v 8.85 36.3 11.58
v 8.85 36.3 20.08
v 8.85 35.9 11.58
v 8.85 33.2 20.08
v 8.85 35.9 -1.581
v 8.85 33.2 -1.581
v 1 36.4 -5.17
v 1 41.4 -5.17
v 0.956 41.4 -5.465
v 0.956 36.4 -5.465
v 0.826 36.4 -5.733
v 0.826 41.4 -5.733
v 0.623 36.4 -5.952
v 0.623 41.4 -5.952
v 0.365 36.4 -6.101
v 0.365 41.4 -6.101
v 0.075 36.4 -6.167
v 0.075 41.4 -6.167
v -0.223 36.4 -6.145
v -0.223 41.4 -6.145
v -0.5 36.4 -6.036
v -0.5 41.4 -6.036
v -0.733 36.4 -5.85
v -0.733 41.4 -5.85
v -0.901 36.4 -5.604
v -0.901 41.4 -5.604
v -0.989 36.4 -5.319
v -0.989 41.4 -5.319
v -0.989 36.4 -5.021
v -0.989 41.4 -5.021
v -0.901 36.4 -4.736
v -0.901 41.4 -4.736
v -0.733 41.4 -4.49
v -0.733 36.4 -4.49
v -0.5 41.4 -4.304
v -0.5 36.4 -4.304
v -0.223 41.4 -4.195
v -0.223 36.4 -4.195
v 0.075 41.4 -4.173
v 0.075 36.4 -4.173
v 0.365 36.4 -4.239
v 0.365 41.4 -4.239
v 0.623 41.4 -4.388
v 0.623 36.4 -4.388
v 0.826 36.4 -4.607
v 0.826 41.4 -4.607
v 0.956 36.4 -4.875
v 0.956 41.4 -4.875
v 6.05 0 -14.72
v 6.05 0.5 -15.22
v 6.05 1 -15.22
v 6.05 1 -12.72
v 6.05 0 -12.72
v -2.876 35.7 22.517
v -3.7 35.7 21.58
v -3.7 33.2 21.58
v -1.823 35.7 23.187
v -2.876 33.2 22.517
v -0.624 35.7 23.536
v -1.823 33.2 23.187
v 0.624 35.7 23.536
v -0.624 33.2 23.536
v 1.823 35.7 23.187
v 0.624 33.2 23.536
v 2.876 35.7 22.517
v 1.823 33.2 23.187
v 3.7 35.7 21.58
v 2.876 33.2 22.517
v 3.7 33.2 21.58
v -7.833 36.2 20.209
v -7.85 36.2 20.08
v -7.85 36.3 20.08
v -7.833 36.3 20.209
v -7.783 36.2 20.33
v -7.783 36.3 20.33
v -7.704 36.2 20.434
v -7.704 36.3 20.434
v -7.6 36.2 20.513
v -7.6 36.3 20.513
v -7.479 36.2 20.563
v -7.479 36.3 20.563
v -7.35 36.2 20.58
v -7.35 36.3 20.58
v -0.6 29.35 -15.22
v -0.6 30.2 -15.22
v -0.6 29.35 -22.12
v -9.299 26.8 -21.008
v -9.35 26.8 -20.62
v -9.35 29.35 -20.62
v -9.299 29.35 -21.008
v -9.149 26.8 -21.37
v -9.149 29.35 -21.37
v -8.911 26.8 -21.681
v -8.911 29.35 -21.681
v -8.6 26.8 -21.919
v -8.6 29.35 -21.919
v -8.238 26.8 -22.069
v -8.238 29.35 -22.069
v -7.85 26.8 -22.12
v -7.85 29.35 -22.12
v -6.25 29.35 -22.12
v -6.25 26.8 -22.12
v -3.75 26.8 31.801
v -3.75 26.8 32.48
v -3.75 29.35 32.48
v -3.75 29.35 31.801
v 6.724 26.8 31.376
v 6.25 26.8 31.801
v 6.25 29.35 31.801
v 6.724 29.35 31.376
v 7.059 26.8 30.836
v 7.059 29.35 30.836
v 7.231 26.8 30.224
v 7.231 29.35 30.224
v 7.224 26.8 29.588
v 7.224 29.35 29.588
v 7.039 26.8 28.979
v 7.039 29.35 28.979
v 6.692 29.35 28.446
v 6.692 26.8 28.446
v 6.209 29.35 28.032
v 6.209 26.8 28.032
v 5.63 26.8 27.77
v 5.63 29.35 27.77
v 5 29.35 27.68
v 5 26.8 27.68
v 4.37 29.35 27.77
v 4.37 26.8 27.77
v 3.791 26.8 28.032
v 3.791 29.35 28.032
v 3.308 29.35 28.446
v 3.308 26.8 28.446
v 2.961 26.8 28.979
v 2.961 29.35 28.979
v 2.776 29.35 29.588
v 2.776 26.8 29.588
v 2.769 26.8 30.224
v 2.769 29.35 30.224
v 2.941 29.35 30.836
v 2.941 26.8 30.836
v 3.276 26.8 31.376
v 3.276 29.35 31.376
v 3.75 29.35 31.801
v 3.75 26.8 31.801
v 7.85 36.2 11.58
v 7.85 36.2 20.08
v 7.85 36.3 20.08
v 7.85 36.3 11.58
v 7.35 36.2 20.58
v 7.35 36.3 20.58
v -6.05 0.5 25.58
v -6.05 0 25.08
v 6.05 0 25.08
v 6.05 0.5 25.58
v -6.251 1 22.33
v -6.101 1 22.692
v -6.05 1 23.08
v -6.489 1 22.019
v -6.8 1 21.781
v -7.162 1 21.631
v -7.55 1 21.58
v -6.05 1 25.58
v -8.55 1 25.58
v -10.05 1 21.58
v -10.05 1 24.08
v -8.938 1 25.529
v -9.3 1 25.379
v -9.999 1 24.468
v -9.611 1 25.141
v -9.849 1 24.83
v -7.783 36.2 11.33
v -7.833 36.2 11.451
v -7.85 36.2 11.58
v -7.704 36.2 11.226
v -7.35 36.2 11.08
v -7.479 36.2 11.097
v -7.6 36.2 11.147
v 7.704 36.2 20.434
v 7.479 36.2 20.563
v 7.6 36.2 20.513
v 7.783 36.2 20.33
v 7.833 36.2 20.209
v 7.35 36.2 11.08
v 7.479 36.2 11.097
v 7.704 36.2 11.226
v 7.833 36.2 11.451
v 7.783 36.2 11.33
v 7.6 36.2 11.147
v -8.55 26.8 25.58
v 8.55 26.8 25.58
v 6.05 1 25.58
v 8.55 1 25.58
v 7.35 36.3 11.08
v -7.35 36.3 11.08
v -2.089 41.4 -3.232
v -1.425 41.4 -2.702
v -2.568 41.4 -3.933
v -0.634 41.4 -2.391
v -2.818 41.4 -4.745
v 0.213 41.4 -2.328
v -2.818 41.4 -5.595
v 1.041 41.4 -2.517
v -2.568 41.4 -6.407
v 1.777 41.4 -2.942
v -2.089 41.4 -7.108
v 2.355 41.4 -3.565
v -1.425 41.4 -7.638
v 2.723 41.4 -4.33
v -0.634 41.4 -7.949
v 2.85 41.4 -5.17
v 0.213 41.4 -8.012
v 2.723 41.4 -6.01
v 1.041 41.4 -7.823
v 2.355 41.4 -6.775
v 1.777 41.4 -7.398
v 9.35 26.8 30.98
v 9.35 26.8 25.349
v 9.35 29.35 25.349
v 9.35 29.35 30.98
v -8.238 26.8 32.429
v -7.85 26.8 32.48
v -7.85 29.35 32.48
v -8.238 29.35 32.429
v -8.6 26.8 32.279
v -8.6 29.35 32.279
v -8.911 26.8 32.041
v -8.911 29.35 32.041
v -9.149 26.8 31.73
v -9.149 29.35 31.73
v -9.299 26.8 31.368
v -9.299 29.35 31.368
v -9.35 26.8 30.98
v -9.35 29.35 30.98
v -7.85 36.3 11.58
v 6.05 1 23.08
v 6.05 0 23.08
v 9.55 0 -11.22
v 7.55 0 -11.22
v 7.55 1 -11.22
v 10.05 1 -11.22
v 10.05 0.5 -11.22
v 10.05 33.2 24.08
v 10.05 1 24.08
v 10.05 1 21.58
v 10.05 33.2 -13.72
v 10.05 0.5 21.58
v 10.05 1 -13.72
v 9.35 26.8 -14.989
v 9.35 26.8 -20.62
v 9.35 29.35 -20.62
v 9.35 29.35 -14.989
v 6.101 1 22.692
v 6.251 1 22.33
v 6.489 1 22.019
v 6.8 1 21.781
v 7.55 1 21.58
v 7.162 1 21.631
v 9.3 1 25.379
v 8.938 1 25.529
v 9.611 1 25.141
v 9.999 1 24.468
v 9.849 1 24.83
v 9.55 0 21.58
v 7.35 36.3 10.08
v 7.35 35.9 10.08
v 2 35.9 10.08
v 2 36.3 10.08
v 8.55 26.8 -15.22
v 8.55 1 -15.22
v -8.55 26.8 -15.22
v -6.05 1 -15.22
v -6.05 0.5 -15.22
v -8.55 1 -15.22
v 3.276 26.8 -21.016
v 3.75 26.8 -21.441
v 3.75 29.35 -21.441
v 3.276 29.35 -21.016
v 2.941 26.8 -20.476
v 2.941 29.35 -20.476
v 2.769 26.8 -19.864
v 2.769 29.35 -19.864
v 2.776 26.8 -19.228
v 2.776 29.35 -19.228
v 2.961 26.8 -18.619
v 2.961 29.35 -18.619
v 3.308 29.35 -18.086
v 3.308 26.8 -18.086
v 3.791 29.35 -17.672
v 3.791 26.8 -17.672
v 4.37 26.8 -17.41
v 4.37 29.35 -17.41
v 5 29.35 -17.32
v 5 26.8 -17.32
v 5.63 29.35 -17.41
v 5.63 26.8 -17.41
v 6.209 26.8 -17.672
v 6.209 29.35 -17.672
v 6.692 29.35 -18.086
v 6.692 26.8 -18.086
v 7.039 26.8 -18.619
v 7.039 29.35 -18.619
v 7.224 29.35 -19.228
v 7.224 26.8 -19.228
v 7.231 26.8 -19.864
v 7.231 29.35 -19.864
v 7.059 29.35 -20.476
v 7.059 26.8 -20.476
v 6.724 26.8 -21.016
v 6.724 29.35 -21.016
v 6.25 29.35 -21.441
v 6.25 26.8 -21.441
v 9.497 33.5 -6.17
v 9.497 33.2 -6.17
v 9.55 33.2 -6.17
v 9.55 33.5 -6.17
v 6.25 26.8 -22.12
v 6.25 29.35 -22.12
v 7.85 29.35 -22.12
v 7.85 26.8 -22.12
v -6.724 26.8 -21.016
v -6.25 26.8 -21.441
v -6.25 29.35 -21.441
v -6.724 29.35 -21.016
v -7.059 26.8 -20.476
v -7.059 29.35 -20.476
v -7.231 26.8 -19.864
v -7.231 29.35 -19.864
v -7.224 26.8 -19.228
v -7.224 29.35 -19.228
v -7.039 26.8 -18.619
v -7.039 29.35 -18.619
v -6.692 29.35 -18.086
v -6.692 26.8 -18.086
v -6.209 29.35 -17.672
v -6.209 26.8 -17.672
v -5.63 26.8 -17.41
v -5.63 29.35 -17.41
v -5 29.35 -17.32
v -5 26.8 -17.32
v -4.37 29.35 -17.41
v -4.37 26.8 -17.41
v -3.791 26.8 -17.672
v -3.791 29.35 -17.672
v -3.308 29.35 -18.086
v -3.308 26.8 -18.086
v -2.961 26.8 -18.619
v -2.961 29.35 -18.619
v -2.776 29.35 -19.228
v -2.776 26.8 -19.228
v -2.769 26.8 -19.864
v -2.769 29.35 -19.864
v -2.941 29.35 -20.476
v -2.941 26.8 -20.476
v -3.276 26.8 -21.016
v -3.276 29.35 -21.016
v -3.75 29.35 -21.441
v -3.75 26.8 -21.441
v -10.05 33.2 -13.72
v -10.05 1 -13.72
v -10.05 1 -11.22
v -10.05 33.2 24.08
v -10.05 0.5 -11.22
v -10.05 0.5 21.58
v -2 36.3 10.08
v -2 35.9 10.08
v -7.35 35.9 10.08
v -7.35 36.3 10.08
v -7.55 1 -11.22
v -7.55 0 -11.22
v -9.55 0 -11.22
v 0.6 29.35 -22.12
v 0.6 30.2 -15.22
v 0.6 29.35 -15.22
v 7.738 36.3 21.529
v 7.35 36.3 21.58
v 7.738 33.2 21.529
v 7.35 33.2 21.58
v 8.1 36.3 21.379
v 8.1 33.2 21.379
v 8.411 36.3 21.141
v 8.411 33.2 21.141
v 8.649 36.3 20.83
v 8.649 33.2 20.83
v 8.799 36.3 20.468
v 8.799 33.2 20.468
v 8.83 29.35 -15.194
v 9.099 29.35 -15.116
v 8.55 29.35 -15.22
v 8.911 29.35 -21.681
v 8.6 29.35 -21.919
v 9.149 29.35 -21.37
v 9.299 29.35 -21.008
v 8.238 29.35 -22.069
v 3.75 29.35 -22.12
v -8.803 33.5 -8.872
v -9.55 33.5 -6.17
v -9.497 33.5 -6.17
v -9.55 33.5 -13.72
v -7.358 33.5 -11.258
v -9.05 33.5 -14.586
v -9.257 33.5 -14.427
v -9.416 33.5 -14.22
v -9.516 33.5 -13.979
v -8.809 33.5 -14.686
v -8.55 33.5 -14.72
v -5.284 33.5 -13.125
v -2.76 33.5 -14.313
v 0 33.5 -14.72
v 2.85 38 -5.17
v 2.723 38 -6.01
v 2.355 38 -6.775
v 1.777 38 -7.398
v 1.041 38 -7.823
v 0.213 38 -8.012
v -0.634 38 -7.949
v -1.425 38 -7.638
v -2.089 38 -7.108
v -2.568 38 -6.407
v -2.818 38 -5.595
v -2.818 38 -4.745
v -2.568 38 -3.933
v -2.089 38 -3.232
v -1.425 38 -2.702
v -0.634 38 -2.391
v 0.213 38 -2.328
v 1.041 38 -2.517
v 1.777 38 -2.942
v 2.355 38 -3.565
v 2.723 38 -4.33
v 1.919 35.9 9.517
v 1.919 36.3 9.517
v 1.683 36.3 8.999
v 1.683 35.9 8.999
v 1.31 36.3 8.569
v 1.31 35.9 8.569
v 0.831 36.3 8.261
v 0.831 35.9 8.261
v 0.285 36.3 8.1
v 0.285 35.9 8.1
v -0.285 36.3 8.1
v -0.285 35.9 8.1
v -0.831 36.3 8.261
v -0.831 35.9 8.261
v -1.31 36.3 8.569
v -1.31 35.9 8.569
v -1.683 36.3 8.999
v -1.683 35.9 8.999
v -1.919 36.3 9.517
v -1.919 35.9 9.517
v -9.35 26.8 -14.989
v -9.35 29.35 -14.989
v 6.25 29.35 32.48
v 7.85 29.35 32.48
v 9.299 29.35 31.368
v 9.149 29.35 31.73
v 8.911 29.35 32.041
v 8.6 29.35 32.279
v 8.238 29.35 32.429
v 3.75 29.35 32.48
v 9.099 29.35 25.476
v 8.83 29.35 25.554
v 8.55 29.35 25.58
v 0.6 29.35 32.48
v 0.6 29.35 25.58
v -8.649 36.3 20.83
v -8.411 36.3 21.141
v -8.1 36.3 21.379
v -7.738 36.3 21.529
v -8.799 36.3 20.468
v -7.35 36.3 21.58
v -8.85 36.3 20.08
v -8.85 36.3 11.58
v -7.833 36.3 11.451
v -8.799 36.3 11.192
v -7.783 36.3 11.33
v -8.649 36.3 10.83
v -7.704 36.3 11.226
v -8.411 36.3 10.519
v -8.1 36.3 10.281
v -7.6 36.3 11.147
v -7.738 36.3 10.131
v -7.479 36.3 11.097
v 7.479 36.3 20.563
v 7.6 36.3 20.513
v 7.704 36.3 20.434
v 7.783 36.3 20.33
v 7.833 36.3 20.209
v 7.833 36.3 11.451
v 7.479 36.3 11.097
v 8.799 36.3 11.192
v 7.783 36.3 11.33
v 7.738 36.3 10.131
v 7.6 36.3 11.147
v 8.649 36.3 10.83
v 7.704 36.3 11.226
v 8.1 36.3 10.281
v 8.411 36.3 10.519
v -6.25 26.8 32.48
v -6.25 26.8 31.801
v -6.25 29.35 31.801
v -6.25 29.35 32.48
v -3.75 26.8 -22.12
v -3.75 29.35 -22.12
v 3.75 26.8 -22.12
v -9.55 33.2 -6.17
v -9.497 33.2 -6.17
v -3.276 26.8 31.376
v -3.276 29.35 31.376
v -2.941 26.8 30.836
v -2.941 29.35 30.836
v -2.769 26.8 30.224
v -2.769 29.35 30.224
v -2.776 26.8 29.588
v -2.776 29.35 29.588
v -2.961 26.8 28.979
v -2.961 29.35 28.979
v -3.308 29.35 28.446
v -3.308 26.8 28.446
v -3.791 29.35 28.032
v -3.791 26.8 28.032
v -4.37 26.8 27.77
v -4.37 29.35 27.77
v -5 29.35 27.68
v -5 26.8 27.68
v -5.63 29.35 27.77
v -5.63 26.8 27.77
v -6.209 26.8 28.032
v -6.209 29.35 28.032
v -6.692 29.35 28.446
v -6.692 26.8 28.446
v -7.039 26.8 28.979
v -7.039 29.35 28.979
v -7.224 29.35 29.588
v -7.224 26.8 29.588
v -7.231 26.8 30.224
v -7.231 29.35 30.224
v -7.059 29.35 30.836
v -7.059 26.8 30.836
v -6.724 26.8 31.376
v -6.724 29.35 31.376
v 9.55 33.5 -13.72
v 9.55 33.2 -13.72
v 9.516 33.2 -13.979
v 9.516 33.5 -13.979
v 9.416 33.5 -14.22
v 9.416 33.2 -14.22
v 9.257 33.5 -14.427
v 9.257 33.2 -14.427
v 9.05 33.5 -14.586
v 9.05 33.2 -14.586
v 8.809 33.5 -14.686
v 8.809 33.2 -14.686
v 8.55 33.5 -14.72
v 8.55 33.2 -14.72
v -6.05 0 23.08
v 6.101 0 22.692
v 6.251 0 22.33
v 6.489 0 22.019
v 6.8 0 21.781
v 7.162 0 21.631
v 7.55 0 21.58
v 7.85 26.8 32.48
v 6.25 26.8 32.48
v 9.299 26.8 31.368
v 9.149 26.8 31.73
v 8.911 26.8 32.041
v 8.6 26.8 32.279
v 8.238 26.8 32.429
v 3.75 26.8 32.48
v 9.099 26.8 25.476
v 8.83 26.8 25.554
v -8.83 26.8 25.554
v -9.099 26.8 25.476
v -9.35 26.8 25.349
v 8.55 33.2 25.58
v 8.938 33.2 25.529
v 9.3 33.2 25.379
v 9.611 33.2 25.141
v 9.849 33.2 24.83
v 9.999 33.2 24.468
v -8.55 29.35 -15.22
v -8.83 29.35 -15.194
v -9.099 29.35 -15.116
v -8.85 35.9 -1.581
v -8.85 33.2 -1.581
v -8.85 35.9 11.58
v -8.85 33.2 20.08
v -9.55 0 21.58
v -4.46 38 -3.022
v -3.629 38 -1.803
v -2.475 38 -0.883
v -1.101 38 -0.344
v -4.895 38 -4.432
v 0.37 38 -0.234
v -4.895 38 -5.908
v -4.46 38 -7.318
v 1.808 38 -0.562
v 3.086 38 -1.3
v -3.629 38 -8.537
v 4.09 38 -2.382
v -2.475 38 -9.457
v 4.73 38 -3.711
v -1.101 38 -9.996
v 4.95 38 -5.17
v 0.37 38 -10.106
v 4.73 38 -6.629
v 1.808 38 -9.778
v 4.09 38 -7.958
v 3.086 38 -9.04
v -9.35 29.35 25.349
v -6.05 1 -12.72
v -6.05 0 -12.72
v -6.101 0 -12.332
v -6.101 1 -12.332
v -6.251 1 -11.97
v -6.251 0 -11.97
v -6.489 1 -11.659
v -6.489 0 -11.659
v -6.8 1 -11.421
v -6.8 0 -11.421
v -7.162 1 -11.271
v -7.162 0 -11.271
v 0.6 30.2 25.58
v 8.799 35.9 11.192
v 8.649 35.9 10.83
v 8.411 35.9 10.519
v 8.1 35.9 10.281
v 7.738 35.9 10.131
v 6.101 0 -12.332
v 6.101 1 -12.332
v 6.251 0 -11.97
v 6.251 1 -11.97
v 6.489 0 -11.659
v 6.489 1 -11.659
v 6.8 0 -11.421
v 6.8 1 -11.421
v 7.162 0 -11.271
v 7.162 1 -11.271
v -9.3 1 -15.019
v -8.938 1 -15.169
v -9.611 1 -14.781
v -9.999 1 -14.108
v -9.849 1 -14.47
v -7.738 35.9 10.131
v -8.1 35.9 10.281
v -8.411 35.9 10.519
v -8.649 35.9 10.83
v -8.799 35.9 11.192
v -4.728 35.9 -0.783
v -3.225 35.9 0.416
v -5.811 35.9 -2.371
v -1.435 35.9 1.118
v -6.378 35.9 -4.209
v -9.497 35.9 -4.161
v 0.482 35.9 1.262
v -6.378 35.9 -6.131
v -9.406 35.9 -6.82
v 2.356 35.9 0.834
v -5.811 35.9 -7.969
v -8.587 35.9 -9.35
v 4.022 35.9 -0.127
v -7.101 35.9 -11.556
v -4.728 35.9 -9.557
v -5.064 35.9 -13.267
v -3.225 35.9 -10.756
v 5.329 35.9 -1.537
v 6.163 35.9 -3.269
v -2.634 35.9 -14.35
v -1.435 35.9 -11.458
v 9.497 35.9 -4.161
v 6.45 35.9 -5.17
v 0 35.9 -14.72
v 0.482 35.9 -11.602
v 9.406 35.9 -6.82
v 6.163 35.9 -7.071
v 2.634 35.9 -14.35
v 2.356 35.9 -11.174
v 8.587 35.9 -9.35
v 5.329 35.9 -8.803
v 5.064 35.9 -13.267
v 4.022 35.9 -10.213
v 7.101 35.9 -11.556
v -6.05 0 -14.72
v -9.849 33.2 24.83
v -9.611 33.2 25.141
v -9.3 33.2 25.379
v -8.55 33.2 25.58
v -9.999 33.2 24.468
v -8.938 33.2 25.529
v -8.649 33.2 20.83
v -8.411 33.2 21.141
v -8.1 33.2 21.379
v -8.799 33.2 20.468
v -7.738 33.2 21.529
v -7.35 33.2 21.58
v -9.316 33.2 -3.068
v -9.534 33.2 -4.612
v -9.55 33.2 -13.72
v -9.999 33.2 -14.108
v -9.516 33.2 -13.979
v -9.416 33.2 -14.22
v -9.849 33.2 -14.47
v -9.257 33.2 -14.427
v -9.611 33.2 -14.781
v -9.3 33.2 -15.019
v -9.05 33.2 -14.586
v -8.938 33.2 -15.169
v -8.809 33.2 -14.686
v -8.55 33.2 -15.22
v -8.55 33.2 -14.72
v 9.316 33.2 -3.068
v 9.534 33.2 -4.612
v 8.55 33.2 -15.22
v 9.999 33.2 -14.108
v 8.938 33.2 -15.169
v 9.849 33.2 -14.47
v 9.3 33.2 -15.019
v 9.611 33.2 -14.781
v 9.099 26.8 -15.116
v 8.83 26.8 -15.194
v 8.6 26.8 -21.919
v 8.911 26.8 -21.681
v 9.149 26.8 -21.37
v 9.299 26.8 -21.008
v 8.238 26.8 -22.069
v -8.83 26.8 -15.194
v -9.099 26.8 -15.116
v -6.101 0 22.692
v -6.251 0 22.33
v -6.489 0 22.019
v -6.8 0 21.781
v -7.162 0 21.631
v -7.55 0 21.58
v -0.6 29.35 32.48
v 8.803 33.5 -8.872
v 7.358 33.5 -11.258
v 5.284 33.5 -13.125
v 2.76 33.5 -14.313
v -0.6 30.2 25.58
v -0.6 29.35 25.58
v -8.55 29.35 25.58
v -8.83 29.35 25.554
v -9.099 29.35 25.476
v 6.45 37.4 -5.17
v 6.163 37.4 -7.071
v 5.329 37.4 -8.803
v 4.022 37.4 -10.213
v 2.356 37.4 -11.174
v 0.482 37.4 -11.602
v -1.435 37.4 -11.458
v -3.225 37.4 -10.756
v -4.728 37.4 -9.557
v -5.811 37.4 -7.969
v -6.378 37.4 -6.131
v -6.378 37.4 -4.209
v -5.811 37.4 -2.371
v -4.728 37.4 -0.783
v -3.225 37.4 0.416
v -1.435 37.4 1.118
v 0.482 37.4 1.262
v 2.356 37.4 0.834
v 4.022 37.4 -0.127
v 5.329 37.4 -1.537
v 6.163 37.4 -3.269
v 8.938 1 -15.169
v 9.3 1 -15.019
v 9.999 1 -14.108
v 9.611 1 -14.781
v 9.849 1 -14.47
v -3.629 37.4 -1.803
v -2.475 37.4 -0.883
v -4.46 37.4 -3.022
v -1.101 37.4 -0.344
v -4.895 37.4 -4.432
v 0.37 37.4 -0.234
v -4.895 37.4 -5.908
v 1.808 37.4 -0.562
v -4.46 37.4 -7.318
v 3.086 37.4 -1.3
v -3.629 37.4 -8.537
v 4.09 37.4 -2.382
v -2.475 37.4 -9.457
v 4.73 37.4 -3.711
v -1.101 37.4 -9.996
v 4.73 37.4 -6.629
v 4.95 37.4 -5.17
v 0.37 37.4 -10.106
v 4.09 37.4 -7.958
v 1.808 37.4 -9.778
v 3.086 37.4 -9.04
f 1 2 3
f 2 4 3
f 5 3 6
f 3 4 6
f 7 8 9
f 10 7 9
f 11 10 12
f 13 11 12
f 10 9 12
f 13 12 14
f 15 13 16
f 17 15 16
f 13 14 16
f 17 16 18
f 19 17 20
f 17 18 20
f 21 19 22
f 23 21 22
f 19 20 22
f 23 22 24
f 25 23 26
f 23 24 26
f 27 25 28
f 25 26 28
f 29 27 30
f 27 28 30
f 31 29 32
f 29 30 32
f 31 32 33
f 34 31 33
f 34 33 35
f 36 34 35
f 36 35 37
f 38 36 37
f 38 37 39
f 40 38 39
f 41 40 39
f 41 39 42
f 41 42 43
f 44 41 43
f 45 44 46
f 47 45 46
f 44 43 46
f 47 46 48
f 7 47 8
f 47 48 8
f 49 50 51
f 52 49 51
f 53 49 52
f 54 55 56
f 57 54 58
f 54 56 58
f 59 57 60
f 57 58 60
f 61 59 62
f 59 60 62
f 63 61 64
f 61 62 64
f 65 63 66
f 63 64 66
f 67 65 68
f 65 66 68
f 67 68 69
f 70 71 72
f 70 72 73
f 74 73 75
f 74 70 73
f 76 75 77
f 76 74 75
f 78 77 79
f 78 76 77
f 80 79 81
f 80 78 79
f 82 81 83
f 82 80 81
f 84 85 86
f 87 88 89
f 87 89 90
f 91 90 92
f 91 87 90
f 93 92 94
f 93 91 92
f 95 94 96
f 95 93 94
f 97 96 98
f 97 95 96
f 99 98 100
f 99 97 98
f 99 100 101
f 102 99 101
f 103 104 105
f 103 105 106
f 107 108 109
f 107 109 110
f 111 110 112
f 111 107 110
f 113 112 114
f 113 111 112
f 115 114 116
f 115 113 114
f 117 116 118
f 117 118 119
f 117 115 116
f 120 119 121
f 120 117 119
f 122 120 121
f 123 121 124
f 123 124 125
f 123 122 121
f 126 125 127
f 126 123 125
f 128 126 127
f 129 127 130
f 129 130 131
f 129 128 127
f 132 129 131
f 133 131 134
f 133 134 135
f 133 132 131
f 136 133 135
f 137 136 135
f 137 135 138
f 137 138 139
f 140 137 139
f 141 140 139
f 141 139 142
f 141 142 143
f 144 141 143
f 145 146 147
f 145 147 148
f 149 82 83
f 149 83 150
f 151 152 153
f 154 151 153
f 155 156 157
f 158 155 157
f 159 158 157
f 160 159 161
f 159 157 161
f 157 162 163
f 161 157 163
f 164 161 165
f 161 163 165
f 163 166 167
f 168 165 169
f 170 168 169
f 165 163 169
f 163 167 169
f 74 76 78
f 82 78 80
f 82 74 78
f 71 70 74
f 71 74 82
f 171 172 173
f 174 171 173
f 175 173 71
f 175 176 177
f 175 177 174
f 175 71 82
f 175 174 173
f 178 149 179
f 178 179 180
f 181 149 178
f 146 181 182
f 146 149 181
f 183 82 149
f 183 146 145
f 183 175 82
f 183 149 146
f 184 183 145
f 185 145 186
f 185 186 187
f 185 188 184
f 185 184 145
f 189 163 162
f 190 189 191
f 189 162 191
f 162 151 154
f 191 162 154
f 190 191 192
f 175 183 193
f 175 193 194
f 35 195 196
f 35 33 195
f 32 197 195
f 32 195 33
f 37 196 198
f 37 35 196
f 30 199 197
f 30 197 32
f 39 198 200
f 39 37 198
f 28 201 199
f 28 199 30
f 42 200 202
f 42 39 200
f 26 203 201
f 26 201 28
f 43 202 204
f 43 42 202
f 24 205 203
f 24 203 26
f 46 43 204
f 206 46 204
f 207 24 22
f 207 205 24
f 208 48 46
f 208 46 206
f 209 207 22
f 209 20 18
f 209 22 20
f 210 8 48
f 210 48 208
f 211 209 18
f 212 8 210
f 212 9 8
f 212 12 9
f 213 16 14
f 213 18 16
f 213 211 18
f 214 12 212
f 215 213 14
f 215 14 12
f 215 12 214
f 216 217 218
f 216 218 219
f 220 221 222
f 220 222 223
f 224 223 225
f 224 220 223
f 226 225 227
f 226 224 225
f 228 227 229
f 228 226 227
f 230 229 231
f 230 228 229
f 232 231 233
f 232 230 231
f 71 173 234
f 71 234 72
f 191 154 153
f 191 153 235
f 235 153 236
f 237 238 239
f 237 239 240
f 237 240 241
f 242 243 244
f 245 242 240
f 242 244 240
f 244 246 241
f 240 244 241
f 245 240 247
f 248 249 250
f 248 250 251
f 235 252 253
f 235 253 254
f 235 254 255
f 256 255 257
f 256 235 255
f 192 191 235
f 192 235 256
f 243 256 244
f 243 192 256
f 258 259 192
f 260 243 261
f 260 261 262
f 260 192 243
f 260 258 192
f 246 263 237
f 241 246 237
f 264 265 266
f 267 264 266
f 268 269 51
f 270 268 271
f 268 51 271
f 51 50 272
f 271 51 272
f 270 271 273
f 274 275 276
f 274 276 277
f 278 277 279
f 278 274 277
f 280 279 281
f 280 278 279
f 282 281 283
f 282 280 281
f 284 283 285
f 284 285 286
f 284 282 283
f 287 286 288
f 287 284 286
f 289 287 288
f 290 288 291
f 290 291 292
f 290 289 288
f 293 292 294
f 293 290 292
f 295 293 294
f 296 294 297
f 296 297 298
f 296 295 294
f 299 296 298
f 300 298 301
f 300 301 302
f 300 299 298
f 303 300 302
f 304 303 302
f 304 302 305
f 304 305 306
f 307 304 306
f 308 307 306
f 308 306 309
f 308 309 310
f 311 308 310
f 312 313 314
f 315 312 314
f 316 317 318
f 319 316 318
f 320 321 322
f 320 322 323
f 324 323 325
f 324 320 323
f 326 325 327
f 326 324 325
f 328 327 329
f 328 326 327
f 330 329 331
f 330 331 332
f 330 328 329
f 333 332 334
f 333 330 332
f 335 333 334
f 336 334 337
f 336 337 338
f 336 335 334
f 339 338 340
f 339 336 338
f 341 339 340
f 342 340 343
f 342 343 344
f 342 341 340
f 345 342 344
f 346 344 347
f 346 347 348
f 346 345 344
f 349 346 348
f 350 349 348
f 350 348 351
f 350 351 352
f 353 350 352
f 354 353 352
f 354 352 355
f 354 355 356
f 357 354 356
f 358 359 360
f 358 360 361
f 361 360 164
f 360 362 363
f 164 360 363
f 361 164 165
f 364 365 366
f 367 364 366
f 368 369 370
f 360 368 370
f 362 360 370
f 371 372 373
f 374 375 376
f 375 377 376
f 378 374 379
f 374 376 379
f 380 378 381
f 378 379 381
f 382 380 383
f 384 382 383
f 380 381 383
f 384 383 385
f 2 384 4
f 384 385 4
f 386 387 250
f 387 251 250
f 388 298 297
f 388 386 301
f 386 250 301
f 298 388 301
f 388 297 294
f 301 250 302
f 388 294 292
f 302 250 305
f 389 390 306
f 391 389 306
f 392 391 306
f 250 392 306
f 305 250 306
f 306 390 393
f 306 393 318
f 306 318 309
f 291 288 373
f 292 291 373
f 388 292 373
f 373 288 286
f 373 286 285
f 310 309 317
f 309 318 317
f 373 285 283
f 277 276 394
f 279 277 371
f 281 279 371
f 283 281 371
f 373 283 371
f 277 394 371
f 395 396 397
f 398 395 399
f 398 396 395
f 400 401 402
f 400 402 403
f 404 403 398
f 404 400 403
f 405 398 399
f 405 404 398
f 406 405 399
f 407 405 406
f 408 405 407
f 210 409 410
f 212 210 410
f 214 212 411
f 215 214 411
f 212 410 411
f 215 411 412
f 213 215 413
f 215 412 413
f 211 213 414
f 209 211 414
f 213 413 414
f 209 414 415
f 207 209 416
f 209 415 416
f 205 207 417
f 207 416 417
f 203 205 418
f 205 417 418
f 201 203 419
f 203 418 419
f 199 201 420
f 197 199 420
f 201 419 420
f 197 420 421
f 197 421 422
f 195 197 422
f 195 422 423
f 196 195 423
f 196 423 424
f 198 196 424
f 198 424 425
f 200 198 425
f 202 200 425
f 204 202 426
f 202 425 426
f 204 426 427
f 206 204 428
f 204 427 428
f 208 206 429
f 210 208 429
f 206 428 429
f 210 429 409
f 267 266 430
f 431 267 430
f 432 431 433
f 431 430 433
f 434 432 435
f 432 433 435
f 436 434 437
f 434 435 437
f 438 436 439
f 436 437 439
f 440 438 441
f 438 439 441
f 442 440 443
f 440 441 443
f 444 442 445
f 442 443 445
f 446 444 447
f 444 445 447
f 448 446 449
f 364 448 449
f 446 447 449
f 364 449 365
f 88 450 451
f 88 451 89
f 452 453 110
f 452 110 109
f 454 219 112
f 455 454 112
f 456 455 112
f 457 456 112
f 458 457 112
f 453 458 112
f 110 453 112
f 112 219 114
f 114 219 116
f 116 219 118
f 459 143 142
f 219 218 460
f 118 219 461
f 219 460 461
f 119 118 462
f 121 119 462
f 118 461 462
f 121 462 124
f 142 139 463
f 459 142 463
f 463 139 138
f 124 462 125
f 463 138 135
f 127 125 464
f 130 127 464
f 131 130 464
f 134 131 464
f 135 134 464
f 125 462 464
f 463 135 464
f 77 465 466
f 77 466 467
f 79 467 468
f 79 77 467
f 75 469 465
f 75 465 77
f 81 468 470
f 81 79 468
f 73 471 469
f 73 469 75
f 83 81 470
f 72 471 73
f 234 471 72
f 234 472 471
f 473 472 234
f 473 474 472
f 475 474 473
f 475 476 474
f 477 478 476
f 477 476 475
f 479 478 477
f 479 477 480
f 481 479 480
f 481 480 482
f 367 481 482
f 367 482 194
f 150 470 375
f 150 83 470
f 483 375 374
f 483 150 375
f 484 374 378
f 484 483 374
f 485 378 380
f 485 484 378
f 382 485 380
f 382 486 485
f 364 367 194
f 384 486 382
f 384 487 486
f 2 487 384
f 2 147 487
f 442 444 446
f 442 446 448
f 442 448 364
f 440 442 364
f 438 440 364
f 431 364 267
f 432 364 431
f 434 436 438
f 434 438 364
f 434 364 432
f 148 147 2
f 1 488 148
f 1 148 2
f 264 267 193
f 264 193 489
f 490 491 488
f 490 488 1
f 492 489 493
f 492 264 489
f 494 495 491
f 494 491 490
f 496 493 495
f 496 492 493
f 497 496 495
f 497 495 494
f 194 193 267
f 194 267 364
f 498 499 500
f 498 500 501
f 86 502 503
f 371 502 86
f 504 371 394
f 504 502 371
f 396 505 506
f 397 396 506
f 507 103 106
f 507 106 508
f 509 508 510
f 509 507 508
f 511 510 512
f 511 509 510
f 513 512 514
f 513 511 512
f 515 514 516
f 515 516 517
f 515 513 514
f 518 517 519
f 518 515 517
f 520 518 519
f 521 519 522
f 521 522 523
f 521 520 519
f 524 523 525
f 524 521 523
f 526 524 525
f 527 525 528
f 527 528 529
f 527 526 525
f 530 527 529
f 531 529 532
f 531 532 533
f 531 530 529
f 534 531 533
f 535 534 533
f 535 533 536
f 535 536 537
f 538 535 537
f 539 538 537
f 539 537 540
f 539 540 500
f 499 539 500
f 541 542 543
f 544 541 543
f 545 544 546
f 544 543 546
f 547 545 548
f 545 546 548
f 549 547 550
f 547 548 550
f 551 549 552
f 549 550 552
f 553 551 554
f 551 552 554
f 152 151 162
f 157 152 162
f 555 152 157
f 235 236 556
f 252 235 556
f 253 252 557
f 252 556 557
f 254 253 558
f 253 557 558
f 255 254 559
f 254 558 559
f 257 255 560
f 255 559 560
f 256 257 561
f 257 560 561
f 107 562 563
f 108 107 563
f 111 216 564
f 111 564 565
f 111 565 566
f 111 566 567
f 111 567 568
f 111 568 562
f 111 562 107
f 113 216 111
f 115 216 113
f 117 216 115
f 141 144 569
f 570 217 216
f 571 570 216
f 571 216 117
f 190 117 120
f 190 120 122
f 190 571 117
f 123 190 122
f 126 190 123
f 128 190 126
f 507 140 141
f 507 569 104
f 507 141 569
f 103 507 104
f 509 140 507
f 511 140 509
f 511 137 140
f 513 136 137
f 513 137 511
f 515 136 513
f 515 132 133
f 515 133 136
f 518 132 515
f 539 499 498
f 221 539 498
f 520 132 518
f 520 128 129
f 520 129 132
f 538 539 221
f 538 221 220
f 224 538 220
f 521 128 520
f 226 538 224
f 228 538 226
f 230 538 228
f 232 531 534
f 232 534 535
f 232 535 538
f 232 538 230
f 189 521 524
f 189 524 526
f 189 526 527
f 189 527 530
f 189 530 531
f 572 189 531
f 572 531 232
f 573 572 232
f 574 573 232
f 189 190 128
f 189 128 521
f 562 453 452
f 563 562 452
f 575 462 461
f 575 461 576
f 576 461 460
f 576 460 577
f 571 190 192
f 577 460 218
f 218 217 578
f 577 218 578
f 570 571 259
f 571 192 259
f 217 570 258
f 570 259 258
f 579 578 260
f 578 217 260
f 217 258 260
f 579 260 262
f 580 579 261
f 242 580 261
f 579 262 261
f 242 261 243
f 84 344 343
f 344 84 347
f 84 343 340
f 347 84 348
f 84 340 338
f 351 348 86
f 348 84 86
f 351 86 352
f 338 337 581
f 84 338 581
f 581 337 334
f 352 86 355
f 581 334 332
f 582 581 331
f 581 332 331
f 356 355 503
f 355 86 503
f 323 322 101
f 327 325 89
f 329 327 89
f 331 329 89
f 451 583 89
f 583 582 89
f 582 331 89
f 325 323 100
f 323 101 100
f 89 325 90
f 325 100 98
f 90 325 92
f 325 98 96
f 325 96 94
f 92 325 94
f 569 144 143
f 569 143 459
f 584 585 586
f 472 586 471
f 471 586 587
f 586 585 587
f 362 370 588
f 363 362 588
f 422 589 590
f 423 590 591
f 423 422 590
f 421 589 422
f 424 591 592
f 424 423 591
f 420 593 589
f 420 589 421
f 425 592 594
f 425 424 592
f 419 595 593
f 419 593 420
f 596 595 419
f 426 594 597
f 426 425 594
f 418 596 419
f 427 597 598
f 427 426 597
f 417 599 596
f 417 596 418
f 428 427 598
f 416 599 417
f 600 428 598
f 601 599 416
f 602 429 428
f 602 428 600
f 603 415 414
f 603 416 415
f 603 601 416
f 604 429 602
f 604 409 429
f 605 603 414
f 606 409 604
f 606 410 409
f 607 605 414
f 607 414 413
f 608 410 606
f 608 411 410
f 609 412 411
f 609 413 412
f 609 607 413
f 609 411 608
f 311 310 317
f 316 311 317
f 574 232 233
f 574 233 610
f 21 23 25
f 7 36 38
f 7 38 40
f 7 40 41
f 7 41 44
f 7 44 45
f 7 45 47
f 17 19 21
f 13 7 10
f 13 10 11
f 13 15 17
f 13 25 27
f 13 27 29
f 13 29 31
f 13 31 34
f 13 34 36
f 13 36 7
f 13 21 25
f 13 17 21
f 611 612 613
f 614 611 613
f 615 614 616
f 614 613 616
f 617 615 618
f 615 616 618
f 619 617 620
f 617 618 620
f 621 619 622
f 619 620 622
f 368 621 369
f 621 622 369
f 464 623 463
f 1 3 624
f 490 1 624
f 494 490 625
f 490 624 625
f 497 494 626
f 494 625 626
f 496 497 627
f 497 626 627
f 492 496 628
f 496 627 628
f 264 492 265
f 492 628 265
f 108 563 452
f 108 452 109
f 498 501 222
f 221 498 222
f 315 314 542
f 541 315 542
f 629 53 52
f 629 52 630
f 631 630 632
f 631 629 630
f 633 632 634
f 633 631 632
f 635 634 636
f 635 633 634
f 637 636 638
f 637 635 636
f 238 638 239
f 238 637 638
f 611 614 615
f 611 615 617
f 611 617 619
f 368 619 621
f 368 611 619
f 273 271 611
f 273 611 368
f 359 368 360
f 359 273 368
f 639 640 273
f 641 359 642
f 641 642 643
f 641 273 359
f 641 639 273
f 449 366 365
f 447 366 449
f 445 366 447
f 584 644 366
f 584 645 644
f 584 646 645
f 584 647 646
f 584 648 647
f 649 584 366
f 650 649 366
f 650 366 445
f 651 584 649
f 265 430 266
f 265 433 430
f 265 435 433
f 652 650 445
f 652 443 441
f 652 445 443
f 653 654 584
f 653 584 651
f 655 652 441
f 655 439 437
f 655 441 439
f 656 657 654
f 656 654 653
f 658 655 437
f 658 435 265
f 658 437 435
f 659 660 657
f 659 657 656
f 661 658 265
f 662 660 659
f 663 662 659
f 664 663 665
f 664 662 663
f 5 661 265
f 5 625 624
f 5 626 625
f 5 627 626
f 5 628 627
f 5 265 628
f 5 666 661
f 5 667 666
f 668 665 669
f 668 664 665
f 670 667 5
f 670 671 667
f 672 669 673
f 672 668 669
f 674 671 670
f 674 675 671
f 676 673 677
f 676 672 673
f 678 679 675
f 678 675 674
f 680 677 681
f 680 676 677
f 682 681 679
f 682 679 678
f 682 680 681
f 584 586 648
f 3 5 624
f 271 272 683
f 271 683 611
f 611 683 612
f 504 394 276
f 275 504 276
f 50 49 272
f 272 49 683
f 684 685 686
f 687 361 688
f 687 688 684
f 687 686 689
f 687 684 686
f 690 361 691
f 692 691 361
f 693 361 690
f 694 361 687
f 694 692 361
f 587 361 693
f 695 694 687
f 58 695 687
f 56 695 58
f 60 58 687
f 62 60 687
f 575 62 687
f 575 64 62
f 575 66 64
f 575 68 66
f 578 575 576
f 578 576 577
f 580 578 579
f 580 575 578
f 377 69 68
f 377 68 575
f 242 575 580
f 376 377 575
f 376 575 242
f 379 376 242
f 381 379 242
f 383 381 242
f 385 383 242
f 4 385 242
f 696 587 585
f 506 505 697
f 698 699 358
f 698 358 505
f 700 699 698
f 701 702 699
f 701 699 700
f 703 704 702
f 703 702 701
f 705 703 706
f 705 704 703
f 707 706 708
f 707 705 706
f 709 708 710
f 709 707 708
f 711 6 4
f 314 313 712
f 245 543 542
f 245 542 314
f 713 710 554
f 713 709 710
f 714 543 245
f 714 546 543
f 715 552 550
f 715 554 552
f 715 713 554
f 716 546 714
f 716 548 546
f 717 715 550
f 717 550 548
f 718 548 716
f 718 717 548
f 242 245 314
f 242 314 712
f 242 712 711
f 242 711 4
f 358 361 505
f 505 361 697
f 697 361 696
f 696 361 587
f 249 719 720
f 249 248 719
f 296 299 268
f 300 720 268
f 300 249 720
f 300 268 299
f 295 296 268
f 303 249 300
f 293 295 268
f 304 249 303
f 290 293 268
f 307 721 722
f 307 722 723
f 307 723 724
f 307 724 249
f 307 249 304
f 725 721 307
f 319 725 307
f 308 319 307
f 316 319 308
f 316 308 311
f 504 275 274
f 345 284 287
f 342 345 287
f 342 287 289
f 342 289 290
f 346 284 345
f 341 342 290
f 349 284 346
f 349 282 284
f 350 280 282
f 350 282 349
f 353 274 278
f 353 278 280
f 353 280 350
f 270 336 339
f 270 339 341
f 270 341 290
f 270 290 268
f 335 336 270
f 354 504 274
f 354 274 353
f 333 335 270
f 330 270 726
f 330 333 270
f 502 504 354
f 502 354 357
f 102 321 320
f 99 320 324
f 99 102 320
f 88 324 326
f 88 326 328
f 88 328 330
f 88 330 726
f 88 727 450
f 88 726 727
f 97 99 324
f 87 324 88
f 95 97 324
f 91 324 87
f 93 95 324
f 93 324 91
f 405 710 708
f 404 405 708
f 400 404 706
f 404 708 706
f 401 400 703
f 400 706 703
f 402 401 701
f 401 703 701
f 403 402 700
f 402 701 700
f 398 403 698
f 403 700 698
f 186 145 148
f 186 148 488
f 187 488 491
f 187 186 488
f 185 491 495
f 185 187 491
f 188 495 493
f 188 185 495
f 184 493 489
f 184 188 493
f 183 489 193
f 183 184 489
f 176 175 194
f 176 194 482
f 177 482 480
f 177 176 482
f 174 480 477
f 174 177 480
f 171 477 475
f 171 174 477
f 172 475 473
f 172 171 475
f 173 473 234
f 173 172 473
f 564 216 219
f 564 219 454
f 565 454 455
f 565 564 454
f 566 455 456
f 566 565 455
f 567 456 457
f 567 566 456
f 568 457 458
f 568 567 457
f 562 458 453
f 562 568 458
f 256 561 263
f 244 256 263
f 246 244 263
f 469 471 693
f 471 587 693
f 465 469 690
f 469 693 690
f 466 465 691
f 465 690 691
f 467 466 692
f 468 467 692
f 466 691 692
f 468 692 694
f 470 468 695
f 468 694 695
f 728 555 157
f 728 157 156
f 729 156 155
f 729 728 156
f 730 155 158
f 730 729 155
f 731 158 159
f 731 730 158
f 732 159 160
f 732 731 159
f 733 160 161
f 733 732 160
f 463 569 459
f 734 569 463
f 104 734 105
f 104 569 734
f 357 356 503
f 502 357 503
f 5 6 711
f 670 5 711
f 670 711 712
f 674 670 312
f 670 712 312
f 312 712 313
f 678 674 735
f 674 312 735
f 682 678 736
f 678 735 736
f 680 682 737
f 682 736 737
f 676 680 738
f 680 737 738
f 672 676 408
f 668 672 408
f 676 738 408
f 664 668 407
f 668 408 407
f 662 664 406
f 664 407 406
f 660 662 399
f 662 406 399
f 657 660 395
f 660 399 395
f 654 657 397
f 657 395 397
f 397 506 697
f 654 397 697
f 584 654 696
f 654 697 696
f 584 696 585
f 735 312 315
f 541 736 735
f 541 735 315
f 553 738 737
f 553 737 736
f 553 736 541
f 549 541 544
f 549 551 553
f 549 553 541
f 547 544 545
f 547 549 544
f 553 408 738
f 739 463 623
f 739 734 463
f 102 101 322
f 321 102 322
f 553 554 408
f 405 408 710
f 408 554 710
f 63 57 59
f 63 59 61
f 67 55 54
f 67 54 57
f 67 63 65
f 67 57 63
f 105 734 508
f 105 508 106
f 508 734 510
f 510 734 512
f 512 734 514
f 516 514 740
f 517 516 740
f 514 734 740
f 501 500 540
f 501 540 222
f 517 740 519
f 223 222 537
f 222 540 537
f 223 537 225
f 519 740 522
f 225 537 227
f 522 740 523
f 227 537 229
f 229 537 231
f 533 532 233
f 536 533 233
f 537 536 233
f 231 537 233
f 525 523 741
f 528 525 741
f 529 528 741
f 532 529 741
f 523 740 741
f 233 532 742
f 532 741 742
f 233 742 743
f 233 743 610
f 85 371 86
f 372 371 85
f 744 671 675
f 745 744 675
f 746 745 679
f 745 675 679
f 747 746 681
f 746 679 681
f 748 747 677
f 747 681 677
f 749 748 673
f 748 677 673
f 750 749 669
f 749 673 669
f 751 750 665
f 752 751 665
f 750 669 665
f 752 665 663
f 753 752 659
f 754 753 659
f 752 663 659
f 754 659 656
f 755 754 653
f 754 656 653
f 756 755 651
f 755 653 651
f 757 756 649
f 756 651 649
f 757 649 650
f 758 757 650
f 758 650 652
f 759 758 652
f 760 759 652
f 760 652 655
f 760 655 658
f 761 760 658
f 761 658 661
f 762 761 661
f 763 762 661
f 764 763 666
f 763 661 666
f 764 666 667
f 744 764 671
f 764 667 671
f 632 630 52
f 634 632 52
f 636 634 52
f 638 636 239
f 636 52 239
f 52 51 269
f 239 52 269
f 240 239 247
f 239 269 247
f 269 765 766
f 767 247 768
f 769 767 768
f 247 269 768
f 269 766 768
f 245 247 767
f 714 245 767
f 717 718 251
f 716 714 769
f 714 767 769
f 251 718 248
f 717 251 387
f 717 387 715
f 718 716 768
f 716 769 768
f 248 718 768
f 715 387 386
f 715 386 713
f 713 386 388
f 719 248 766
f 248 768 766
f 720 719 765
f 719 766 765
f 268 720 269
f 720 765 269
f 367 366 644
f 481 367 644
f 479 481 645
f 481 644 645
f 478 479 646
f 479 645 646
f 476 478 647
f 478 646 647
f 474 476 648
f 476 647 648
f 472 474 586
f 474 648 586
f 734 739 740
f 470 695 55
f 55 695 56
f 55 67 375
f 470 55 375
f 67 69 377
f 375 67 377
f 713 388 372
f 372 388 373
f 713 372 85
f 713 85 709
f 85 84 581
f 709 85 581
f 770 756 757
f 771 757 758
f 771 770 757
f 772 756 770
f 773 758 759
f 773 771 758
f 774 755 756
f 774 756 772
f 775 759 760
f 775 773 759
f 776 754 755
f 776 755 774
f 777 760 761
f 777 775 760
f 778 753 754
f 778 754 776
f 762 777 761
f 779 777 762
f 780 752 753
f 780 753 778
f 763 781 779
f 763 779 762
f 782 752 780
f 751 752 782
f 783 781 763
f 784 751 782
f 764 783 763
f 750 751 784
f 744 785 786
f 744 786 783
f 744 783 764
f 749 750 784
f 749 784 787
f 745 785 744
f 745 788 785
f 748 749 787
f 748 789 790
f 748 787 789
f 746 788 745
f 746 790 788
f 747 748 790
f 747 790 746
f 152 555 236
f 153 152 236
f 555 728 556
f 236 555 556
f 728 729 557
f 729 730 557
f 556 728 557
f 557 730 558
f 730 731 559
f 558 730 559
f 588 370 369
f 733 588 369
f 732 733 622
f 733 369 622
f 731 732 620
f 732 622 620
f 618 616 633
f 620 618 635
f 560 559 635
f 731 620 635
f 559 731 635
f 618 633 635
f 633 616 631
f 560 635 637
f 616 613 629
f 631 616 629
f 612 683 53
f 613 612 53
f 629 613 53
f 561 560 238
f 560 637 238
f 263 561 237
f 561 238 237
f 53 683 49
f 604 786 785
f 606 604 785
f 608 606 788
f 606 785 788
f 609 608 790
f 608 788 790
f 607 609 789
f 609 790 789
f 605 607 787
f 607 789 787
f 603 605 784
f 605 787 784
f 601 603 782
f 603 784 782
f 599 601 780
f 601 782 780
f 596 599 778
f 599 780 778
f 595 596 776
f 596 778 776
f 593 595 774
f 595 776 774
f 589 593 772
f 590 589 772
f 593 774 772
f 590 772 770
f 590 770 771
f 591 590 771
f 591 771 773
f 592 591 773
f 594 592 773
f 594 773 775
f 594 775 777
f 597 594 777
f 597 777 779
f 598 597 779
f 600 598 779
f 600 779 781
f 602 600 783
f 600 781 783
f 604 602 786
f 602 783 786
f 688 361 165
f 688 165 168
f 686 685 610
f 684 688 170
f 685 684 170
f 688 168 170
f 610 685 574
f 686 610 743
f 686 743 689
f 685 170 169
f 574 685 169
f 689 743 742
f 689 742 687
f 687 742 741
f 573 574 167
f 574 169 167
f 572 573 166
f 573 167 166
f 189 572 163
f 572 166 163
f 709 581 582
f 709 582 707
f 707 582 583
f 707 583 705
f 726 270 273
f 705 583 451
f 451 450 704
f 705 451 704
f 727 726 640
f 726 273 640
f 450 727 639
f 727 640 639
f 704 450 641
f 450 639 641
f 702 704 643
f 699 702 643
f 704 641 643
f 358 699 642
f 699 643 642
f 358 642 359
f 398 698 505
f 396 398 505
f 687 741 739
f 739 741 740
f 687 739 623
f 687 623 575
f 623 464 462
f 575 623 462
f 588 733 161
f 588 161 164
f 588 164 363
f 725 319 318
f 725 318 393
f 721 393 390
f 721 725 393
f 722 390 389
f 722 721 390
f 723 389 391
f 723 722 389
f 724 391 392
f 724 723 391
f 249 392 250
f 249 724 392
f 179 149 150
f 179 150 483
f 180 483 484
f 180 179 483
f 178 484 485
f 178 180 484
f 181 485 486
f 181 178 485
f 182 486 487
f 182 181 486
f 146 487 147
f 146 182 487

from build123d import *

# Parameters (mm, degrees)
BOSS_EXTRUDE1_DEPTH  = 33.2
BOSS_EXTRUDE2_DEPTH  = 2.55
BOSS_EXTRUDE11_DEPTH = 0.3
BOSS_EXTRUDE3_DEPTH  = 2.7
SKETCH6_R            = 4.4225
BOSS_EXTRUDE4_DEPTH  = 2.5
SKETCH7_R            = 6.45
BOSS_EXTRUDE5_DEPTH  = 1.5
SKETCH8_R            = 4.95
BOSS_EXTRUDE6_DEPTH  = 0.6
SKETCH10_R           = 2.85
BOSS_EXTRUDE7_DEPTH  = 3.4
SKETCH12_R           = 1
CUT_EXTRUDE1_DEPTH   = 5
BOSS_EXTRUDE9_DEPTH  = 0.4
BOSS_EXTRUDE10_DEPTH = 0.3
CHAMFER1_SIZE        = 0.5
CUT_EXTRUDE2_DEPTH   = 1
MIRROR2_COPY_1_DEPTH = 1
BOSS_EXTRUDE12_DEPTH = 0.6


with BuildPart() as part:
    # Sketch1 → Boss-Extrude1 (new body)
    with BuildSketch(Plane(origin=(0, 0, 0), x_dir=(1, 0, 0), z_dir=(0, 1, 0))):
        with BuildLine():
            Line((-8.55, -25.58), (8.55, -25.58))
            ThreePointArc((8.55, -25.58), (9.610660172, -25.140660172), (10.05, -24.08))
            Line((10.05, -24.08), (10.05, 13.72))
            ThreePointArc((10.05, 13.72), (9.610660172, 14.780660172), (8.55, 15.22))
            Line((8.55, 15.22), (-8.55, 15.22))
            ThreePointArc((-8.55, 15.22), (-9.610660172, 14.780660172), (-10.05, 13.72))
            Line((-10.05, 13.72), (-10.05, -24.08))
            ThreePointArc((-10.05, -24.08), (-9.610660172, -25.140660172), (-8.55, -25.58))
        make_face()
    extrude(amount=BOSS_EXTRUDE1_DEPTH)

    # Sketch4 → Boss-Extrude2 (add)
    with BuildSketch(Plane(origin=(0, 26.8, 0), x_dir=(1, 0, 0), z_dir=(0, 1, 0))):
        with BuildLine():
            Line((-6.25, 22.12), (-6.25, 21.440828693))
            ThreePointArc((-6.25, 21.440828693), (-5, 17.32), (-3.75, 21.440828693))
            Line((-3.75, 21.440828693), (-3.75, 22.12))
            Line((-3.75, 22.12), (3.75, 22.12))
            Line((3.75, 22.12), (3.75, 21.440828693))
            ThreePointArc((3.75, 21.440828693), (5, 17.32), (6.25, 21.440828693))
            Line((6.25, 21.440828693), (6.25, 22.12))
            Line((6.25, 22.12), (7.85, 22.12))
            ThreePointArc((7.85, 22.12), (8.910660172, 21.680660172), (9.35, 20.62))
            Line((9.35, 20.62), (9.35, -30.98))
            ThreePointArc((9.35, -30.98), (8.910660172, -32.040660172), (7.85, -32.48))
            Line((7.85, -32.48), (6.25, -32.48))
            Line((6.25, -32.48), (6.25, -31.800828693))
            ThreePointArc((6.25, -31.800828693), (5, -27.68), (3.75, -31.800828693))
            Line((3.75, -31.800828693), (3.75, -32.48))
            Line((3.75, -32.48), (-3.75, -32.48))
            Line((-3.75, -32.48), (-3.75, -31.800828693))
            ThreePointArc((-3.75, -31.800828693), (-5, -27.68), (-6.25, -31.800828693))
            Line((-6.25, -31.800828693), (-6.25, -32.48))
            Line((-6.25, -32.48), (-7.85, -32.48))
            ThreePointArc((-7.85, -32.48), (-8.910660172, -32.040660172), (-9.35, -30.98))
            Line((-9.35, -30.98), (-9.35, 20.62))
            ThreePointArc((-9.35, 20.62), (-8.910660172, 21.680660172), (-7.85, 22.12))
            Line((-7.85, 22.12), (-6.25, 22.12))
        make_face()
    extrude(amount=BOSS_EXTRUDE2_DEPTH)

    # Sketch16 → Boss-Extrude11 (add)
    with BuildSketch(Plane(origin=(0, 33.2, 0), x_dir=(1, 0, 0), z_dir=(0, 1, 0))):
        with BuildLine():
            Line((-9.55, 13.72), (-9.55, 6.17))
            Line((-9.55, 6.17), (9.55, 6.17))
            Line((9.55, 6.17), (9.55, 13.72))
            ThreePointArc((9.55, 13.72), (9.257106781, 14.427106781), (8.55, 14.72))
            Line((8.55, 14.72), (-8.55, 14.72))
            ThreePointArc((-8.55, 14.72), (-9.257106781, 14.427106781), (-9.55, 13.72))
        make_face()
    extrude(amount=BOSS_EXTRUDE11_DEPTH)

    # Sketch5 → Boss-Extrude3 (add)
    with BuildSketch(Plane(origin=(0, 33.2, 0), x_dir=(1, 0, 0), z_dir=(0, 1, 0))):
        with BuildLine():
            Line((-8.85, 1.581128311), (-8.85, -20.08))
            ThreePointArc((-8.85, -20.08), (-8.410660172, -21.140660172), (-7.35, -21.58))
            Line((-7.35, -21.58), (7.35, -21.58))
            ThreePointArc((7.35, -21.58), (8.410660172, -21.140660172), (8.85, -20.08))
            Line((8.85, -20.08), (8.85, 1.581128311))
            ThreePointArc((8.85, 1.581128311), (0, 14.72), (-8.85, 1.581128311))
        make_face()
    extrude(amount=BOSS_EXTRUDE3_DEPTH)

    # Sketch6 → Boss-Extrude4 (add)
    with BuildSketch(Plane(origin=(0, 33.2, 0), x_dir=(1, 0, 0), z_dir=(0, 1, 0))):
        with Locations((0, -19.1575)):
            Circle(SKETCH6_R)
    extrude(amount=BOSS_EXTRUDE4_DEPTH)

    # Sketch7 → Boss-Extrude5 (add)
    with BuildSketch(Plane(origin=(0, 35.9, 0), x_dir=(1, 0, 0), z_dir=(0, 1, 0))):
        with Locations((0, 5.17)):
            Circle(SKETCH7_R)
    extrude(amount=BOSS_EXTRUDE5_DEPTH)

    # Sketch8 → Boss-Extrude6 (add)
    with BuildSketch(Plane(origin=(0, 37.4, 0), x_dir=(1, 0, 0), z_dir=(0, 1, 0))):
        with Locations((0, 5.17)):
            Circle(SKETCH8_R)
    extrude(amount=BOSS_EXTRUDE6_DEPTH)

    # Sketch10 → Boss-Extrude7 (add)
    with BuildSketch(Plane(origin=(0, 38, 0), x_dir=(1, 0, 0), z_dir=(0, 1, 0))):
        with Locations((0, 5.17)):
            Circle(SKETCH10_R)
    extrude(amount=BOSS_EXTRUDE7_DEPTH)

    # Sketch12 → Cut-Extrude1 (cut)
    with BuildSketch(Plane(origin=(0, 41.4, 0), x_dir=(1, 0, 0), z_dir=(0, 1, 0))):
        with Locations((0, 5.17)):
            Circle(SKETCH12_R)
    extrude(amount=-CUT_EXTRUDE1_DEPTH, mode=Mode.SUBTRACT)

    # Sketch13 → Boss-Extrude9 (add)
    with BuildSketch(Plane(origin=(0, 35.9, 0), x_dir=(1, 0, 0), z_dir=(0, 1, 0))):
        with BuildLine():
            Line((-8.85, -11.58), (-8.85, -20.08))
            ThreePointArc((-8.85, -20.08), (-8.410660172, -21.140660172), (-7.35, -21.58))
            Line((-7.35, -21.58), (7.35, -21.58))
            ThreePointArc((7.35, -21.58), (8.410660172, -21.140660172), (8.85, -20.08))
            Line((8.85, -20.08), (8.85, -11.58))
            ThreePointArc((8.85, -11.58), (8.410660172, -10.519339828), (7.35, -10.08))
            Line((7.35, -10.08), (2, -10.08))
            ThreePointArc((2, -10.08), (0, -8.08), (-2, -10.08))
            Line((-2, -10.08), (-7.35, -10.08))
            ThreePointArc((-7.35, -10.08), (-8.410660172, -10.519339828), (-8.85, -11.58))
        make_face()
        with BuildLine():
            Line((-7.85, -11.58), (-7.85, -20.08))
            ThreePointArc((-7.85, -20.08), (-7.703553391, -20.433553391), (-7.35, -20.58))
            Line((-7.35, -20.58), (7.35, -20.58))
            ThreePointArc((7.35, -20.58), (7.703553391, -20.433553391), (7.85, -20.08))
            Line((7.85, -20.08), (7.85, -11.58))
            ThreePointArc((7.85, -11.58), (7.703553391, -11.226446609), (7.35, -11.08))
            Line((7.35, -11.08), (-7.35, -11.08))
            ThreePointArc((-7.35, -11.08), (-7.703553391, -11.226446609), (-7.85, -11.58))
        make_face(mode=Mode.SUBTRACT)
    extrude(amount=BOSS_EXTRUDE9_DEPTH)

    # Sketch14 → Boss-Extrude10 (add)
    with BuildSketch(Plane(origin=(0, 35.9, 0), x_dir=(1, 0, 0), z_dir=(0, 1, 0))):
        with BuildLine():
            Line((-7.85, -11.58), (-7.85, -20.08))
            ThreePointArc((-7.85, -20.08), (-7.703553391, -20.433553391), (-7.35, -20.58))
            Line((-7.35, -20.58), (7.35, -20.58))
            ThreePointArc((7.35, -20.58), (7.703553391, -20.433553391), (7.85, -20.08))
            Line((7.85, -20.08), (7.85, -11.58))
            ThreePointArc((7.85, -11.58), (7.703553391, -11.226446609), (7.35, -11.08))
            Line((7.35, -11.08), (-7.35, -11.08))
            ThreePointArc((-7.35, -11.08), (-7.703553391, -11.226446609), (-7.85, -11.58))
        make_face()
    extrude(amount=BOSS_EXTRUDE10_DEPTH)

    # Chamfer1
    chamfer1_edges = [part.edges().sort_by_distance(p)[0] for p in [
        (-10.05, 0, 5.18),
        (-9.610660172, 0, -14.780660172),
        (0, 0, -15.22),
        (9.610660172, 0, -14.780660172),
        (10.05, 0, 5.18),
        (9.610660172, 0, 25.140660172),
        (0, 0, 25.58),
        (-9.610660172, 0, 25.140660172),
    ]]
    chamfer(chamfer1_edges, length=CHAMFER1_SIZE)

    # Sketch17 → Cut-Extrude2 (cut)
    with BuildSketch(Plane.XZ):
        with BuildLine():
            Line((-10.05, 21.58), (-10.05, 24.08))
            ThreePointArc((-10.05, 24.08), (-9.610660172, 25.140660172), (-8.55, 25.58))
            Line((-8.55, 25.58), (-6.05, 25.58))
            Line((-6.05, 25.58), (-6.05, 23.08))
            ThreePointArc((-6.05, 23.08), (-6.489339828, 22.019339828), (-7.55, 21.58))
            Line((-7.55, 21.58), (-10.05, 21.58))
        make_face()
    cut_extrude2 = extrude(amount=-CUT_EXTRUDE2_DEPTH, mode=Mode.SUBTRACT)

    # Mirror1: Cut-Extrude2 across plane
    add(cut_extrude2.mirror(Plane(origin=(0, 0, 0), x_dir=(0, 0, 1), z_dir=(1, 0, 0))), mode=Mode.SUBTRACT)

    # Mirror2: Cut-Extrude2 across plane
    add(cut_extrude2.mirror(Plane.XY.offset(5.18)), mode=Mode.SUBTRACT)

    # Mirror2 copy 1 sketch → Mirror2 copy 1 (cut)
    with BuildSketch(Plane(origin=(0, 0, 10.36), x_dir=(-1, 0, 0), z_dir=(0, -1, 0))):
        with BuildLine():
            Line((-10.05, 21.58), (-10.05, 24.08))
            ThreePointArc((-10.05, 24.08), (-9.610660172, 25.140660172), (-8.55, 25.58))
            Line((-8.55, 25.58), (-6.05, 25.58))
            Line((-6.05, 25.58), (-6.05, 23.08))
            ThreePointArc((-6.05, 23.08), (-6.489339828, 22.019339828), (-7.55, 21.58))
            Line((-7.55, 21.58), (-10.05, 21.58))
        make_face()
    extrude(amount=-MIRROR2_COPY_1_DEPTH, mode=Mode.SUBTRACT)

    # Sketch19 → Boss-Extrude12 (add, symmetric)
    with BuildSketch(Plane(origin=(0, 0, 0), x_dir=(0, 0, -1), z_dir=(1, 0, 0))):
        Polygon((-25.58, 30.2), (-25.58, 29.35), (-32.48, 29.35), align=None)
        Polygon((15.22, 30.2), (15.22, 29.35), (22.12, 29.35), align=None)
    extrude(amount=BOSS_EXTRUDE12_DEPTH, both=True)


solid = part.part
